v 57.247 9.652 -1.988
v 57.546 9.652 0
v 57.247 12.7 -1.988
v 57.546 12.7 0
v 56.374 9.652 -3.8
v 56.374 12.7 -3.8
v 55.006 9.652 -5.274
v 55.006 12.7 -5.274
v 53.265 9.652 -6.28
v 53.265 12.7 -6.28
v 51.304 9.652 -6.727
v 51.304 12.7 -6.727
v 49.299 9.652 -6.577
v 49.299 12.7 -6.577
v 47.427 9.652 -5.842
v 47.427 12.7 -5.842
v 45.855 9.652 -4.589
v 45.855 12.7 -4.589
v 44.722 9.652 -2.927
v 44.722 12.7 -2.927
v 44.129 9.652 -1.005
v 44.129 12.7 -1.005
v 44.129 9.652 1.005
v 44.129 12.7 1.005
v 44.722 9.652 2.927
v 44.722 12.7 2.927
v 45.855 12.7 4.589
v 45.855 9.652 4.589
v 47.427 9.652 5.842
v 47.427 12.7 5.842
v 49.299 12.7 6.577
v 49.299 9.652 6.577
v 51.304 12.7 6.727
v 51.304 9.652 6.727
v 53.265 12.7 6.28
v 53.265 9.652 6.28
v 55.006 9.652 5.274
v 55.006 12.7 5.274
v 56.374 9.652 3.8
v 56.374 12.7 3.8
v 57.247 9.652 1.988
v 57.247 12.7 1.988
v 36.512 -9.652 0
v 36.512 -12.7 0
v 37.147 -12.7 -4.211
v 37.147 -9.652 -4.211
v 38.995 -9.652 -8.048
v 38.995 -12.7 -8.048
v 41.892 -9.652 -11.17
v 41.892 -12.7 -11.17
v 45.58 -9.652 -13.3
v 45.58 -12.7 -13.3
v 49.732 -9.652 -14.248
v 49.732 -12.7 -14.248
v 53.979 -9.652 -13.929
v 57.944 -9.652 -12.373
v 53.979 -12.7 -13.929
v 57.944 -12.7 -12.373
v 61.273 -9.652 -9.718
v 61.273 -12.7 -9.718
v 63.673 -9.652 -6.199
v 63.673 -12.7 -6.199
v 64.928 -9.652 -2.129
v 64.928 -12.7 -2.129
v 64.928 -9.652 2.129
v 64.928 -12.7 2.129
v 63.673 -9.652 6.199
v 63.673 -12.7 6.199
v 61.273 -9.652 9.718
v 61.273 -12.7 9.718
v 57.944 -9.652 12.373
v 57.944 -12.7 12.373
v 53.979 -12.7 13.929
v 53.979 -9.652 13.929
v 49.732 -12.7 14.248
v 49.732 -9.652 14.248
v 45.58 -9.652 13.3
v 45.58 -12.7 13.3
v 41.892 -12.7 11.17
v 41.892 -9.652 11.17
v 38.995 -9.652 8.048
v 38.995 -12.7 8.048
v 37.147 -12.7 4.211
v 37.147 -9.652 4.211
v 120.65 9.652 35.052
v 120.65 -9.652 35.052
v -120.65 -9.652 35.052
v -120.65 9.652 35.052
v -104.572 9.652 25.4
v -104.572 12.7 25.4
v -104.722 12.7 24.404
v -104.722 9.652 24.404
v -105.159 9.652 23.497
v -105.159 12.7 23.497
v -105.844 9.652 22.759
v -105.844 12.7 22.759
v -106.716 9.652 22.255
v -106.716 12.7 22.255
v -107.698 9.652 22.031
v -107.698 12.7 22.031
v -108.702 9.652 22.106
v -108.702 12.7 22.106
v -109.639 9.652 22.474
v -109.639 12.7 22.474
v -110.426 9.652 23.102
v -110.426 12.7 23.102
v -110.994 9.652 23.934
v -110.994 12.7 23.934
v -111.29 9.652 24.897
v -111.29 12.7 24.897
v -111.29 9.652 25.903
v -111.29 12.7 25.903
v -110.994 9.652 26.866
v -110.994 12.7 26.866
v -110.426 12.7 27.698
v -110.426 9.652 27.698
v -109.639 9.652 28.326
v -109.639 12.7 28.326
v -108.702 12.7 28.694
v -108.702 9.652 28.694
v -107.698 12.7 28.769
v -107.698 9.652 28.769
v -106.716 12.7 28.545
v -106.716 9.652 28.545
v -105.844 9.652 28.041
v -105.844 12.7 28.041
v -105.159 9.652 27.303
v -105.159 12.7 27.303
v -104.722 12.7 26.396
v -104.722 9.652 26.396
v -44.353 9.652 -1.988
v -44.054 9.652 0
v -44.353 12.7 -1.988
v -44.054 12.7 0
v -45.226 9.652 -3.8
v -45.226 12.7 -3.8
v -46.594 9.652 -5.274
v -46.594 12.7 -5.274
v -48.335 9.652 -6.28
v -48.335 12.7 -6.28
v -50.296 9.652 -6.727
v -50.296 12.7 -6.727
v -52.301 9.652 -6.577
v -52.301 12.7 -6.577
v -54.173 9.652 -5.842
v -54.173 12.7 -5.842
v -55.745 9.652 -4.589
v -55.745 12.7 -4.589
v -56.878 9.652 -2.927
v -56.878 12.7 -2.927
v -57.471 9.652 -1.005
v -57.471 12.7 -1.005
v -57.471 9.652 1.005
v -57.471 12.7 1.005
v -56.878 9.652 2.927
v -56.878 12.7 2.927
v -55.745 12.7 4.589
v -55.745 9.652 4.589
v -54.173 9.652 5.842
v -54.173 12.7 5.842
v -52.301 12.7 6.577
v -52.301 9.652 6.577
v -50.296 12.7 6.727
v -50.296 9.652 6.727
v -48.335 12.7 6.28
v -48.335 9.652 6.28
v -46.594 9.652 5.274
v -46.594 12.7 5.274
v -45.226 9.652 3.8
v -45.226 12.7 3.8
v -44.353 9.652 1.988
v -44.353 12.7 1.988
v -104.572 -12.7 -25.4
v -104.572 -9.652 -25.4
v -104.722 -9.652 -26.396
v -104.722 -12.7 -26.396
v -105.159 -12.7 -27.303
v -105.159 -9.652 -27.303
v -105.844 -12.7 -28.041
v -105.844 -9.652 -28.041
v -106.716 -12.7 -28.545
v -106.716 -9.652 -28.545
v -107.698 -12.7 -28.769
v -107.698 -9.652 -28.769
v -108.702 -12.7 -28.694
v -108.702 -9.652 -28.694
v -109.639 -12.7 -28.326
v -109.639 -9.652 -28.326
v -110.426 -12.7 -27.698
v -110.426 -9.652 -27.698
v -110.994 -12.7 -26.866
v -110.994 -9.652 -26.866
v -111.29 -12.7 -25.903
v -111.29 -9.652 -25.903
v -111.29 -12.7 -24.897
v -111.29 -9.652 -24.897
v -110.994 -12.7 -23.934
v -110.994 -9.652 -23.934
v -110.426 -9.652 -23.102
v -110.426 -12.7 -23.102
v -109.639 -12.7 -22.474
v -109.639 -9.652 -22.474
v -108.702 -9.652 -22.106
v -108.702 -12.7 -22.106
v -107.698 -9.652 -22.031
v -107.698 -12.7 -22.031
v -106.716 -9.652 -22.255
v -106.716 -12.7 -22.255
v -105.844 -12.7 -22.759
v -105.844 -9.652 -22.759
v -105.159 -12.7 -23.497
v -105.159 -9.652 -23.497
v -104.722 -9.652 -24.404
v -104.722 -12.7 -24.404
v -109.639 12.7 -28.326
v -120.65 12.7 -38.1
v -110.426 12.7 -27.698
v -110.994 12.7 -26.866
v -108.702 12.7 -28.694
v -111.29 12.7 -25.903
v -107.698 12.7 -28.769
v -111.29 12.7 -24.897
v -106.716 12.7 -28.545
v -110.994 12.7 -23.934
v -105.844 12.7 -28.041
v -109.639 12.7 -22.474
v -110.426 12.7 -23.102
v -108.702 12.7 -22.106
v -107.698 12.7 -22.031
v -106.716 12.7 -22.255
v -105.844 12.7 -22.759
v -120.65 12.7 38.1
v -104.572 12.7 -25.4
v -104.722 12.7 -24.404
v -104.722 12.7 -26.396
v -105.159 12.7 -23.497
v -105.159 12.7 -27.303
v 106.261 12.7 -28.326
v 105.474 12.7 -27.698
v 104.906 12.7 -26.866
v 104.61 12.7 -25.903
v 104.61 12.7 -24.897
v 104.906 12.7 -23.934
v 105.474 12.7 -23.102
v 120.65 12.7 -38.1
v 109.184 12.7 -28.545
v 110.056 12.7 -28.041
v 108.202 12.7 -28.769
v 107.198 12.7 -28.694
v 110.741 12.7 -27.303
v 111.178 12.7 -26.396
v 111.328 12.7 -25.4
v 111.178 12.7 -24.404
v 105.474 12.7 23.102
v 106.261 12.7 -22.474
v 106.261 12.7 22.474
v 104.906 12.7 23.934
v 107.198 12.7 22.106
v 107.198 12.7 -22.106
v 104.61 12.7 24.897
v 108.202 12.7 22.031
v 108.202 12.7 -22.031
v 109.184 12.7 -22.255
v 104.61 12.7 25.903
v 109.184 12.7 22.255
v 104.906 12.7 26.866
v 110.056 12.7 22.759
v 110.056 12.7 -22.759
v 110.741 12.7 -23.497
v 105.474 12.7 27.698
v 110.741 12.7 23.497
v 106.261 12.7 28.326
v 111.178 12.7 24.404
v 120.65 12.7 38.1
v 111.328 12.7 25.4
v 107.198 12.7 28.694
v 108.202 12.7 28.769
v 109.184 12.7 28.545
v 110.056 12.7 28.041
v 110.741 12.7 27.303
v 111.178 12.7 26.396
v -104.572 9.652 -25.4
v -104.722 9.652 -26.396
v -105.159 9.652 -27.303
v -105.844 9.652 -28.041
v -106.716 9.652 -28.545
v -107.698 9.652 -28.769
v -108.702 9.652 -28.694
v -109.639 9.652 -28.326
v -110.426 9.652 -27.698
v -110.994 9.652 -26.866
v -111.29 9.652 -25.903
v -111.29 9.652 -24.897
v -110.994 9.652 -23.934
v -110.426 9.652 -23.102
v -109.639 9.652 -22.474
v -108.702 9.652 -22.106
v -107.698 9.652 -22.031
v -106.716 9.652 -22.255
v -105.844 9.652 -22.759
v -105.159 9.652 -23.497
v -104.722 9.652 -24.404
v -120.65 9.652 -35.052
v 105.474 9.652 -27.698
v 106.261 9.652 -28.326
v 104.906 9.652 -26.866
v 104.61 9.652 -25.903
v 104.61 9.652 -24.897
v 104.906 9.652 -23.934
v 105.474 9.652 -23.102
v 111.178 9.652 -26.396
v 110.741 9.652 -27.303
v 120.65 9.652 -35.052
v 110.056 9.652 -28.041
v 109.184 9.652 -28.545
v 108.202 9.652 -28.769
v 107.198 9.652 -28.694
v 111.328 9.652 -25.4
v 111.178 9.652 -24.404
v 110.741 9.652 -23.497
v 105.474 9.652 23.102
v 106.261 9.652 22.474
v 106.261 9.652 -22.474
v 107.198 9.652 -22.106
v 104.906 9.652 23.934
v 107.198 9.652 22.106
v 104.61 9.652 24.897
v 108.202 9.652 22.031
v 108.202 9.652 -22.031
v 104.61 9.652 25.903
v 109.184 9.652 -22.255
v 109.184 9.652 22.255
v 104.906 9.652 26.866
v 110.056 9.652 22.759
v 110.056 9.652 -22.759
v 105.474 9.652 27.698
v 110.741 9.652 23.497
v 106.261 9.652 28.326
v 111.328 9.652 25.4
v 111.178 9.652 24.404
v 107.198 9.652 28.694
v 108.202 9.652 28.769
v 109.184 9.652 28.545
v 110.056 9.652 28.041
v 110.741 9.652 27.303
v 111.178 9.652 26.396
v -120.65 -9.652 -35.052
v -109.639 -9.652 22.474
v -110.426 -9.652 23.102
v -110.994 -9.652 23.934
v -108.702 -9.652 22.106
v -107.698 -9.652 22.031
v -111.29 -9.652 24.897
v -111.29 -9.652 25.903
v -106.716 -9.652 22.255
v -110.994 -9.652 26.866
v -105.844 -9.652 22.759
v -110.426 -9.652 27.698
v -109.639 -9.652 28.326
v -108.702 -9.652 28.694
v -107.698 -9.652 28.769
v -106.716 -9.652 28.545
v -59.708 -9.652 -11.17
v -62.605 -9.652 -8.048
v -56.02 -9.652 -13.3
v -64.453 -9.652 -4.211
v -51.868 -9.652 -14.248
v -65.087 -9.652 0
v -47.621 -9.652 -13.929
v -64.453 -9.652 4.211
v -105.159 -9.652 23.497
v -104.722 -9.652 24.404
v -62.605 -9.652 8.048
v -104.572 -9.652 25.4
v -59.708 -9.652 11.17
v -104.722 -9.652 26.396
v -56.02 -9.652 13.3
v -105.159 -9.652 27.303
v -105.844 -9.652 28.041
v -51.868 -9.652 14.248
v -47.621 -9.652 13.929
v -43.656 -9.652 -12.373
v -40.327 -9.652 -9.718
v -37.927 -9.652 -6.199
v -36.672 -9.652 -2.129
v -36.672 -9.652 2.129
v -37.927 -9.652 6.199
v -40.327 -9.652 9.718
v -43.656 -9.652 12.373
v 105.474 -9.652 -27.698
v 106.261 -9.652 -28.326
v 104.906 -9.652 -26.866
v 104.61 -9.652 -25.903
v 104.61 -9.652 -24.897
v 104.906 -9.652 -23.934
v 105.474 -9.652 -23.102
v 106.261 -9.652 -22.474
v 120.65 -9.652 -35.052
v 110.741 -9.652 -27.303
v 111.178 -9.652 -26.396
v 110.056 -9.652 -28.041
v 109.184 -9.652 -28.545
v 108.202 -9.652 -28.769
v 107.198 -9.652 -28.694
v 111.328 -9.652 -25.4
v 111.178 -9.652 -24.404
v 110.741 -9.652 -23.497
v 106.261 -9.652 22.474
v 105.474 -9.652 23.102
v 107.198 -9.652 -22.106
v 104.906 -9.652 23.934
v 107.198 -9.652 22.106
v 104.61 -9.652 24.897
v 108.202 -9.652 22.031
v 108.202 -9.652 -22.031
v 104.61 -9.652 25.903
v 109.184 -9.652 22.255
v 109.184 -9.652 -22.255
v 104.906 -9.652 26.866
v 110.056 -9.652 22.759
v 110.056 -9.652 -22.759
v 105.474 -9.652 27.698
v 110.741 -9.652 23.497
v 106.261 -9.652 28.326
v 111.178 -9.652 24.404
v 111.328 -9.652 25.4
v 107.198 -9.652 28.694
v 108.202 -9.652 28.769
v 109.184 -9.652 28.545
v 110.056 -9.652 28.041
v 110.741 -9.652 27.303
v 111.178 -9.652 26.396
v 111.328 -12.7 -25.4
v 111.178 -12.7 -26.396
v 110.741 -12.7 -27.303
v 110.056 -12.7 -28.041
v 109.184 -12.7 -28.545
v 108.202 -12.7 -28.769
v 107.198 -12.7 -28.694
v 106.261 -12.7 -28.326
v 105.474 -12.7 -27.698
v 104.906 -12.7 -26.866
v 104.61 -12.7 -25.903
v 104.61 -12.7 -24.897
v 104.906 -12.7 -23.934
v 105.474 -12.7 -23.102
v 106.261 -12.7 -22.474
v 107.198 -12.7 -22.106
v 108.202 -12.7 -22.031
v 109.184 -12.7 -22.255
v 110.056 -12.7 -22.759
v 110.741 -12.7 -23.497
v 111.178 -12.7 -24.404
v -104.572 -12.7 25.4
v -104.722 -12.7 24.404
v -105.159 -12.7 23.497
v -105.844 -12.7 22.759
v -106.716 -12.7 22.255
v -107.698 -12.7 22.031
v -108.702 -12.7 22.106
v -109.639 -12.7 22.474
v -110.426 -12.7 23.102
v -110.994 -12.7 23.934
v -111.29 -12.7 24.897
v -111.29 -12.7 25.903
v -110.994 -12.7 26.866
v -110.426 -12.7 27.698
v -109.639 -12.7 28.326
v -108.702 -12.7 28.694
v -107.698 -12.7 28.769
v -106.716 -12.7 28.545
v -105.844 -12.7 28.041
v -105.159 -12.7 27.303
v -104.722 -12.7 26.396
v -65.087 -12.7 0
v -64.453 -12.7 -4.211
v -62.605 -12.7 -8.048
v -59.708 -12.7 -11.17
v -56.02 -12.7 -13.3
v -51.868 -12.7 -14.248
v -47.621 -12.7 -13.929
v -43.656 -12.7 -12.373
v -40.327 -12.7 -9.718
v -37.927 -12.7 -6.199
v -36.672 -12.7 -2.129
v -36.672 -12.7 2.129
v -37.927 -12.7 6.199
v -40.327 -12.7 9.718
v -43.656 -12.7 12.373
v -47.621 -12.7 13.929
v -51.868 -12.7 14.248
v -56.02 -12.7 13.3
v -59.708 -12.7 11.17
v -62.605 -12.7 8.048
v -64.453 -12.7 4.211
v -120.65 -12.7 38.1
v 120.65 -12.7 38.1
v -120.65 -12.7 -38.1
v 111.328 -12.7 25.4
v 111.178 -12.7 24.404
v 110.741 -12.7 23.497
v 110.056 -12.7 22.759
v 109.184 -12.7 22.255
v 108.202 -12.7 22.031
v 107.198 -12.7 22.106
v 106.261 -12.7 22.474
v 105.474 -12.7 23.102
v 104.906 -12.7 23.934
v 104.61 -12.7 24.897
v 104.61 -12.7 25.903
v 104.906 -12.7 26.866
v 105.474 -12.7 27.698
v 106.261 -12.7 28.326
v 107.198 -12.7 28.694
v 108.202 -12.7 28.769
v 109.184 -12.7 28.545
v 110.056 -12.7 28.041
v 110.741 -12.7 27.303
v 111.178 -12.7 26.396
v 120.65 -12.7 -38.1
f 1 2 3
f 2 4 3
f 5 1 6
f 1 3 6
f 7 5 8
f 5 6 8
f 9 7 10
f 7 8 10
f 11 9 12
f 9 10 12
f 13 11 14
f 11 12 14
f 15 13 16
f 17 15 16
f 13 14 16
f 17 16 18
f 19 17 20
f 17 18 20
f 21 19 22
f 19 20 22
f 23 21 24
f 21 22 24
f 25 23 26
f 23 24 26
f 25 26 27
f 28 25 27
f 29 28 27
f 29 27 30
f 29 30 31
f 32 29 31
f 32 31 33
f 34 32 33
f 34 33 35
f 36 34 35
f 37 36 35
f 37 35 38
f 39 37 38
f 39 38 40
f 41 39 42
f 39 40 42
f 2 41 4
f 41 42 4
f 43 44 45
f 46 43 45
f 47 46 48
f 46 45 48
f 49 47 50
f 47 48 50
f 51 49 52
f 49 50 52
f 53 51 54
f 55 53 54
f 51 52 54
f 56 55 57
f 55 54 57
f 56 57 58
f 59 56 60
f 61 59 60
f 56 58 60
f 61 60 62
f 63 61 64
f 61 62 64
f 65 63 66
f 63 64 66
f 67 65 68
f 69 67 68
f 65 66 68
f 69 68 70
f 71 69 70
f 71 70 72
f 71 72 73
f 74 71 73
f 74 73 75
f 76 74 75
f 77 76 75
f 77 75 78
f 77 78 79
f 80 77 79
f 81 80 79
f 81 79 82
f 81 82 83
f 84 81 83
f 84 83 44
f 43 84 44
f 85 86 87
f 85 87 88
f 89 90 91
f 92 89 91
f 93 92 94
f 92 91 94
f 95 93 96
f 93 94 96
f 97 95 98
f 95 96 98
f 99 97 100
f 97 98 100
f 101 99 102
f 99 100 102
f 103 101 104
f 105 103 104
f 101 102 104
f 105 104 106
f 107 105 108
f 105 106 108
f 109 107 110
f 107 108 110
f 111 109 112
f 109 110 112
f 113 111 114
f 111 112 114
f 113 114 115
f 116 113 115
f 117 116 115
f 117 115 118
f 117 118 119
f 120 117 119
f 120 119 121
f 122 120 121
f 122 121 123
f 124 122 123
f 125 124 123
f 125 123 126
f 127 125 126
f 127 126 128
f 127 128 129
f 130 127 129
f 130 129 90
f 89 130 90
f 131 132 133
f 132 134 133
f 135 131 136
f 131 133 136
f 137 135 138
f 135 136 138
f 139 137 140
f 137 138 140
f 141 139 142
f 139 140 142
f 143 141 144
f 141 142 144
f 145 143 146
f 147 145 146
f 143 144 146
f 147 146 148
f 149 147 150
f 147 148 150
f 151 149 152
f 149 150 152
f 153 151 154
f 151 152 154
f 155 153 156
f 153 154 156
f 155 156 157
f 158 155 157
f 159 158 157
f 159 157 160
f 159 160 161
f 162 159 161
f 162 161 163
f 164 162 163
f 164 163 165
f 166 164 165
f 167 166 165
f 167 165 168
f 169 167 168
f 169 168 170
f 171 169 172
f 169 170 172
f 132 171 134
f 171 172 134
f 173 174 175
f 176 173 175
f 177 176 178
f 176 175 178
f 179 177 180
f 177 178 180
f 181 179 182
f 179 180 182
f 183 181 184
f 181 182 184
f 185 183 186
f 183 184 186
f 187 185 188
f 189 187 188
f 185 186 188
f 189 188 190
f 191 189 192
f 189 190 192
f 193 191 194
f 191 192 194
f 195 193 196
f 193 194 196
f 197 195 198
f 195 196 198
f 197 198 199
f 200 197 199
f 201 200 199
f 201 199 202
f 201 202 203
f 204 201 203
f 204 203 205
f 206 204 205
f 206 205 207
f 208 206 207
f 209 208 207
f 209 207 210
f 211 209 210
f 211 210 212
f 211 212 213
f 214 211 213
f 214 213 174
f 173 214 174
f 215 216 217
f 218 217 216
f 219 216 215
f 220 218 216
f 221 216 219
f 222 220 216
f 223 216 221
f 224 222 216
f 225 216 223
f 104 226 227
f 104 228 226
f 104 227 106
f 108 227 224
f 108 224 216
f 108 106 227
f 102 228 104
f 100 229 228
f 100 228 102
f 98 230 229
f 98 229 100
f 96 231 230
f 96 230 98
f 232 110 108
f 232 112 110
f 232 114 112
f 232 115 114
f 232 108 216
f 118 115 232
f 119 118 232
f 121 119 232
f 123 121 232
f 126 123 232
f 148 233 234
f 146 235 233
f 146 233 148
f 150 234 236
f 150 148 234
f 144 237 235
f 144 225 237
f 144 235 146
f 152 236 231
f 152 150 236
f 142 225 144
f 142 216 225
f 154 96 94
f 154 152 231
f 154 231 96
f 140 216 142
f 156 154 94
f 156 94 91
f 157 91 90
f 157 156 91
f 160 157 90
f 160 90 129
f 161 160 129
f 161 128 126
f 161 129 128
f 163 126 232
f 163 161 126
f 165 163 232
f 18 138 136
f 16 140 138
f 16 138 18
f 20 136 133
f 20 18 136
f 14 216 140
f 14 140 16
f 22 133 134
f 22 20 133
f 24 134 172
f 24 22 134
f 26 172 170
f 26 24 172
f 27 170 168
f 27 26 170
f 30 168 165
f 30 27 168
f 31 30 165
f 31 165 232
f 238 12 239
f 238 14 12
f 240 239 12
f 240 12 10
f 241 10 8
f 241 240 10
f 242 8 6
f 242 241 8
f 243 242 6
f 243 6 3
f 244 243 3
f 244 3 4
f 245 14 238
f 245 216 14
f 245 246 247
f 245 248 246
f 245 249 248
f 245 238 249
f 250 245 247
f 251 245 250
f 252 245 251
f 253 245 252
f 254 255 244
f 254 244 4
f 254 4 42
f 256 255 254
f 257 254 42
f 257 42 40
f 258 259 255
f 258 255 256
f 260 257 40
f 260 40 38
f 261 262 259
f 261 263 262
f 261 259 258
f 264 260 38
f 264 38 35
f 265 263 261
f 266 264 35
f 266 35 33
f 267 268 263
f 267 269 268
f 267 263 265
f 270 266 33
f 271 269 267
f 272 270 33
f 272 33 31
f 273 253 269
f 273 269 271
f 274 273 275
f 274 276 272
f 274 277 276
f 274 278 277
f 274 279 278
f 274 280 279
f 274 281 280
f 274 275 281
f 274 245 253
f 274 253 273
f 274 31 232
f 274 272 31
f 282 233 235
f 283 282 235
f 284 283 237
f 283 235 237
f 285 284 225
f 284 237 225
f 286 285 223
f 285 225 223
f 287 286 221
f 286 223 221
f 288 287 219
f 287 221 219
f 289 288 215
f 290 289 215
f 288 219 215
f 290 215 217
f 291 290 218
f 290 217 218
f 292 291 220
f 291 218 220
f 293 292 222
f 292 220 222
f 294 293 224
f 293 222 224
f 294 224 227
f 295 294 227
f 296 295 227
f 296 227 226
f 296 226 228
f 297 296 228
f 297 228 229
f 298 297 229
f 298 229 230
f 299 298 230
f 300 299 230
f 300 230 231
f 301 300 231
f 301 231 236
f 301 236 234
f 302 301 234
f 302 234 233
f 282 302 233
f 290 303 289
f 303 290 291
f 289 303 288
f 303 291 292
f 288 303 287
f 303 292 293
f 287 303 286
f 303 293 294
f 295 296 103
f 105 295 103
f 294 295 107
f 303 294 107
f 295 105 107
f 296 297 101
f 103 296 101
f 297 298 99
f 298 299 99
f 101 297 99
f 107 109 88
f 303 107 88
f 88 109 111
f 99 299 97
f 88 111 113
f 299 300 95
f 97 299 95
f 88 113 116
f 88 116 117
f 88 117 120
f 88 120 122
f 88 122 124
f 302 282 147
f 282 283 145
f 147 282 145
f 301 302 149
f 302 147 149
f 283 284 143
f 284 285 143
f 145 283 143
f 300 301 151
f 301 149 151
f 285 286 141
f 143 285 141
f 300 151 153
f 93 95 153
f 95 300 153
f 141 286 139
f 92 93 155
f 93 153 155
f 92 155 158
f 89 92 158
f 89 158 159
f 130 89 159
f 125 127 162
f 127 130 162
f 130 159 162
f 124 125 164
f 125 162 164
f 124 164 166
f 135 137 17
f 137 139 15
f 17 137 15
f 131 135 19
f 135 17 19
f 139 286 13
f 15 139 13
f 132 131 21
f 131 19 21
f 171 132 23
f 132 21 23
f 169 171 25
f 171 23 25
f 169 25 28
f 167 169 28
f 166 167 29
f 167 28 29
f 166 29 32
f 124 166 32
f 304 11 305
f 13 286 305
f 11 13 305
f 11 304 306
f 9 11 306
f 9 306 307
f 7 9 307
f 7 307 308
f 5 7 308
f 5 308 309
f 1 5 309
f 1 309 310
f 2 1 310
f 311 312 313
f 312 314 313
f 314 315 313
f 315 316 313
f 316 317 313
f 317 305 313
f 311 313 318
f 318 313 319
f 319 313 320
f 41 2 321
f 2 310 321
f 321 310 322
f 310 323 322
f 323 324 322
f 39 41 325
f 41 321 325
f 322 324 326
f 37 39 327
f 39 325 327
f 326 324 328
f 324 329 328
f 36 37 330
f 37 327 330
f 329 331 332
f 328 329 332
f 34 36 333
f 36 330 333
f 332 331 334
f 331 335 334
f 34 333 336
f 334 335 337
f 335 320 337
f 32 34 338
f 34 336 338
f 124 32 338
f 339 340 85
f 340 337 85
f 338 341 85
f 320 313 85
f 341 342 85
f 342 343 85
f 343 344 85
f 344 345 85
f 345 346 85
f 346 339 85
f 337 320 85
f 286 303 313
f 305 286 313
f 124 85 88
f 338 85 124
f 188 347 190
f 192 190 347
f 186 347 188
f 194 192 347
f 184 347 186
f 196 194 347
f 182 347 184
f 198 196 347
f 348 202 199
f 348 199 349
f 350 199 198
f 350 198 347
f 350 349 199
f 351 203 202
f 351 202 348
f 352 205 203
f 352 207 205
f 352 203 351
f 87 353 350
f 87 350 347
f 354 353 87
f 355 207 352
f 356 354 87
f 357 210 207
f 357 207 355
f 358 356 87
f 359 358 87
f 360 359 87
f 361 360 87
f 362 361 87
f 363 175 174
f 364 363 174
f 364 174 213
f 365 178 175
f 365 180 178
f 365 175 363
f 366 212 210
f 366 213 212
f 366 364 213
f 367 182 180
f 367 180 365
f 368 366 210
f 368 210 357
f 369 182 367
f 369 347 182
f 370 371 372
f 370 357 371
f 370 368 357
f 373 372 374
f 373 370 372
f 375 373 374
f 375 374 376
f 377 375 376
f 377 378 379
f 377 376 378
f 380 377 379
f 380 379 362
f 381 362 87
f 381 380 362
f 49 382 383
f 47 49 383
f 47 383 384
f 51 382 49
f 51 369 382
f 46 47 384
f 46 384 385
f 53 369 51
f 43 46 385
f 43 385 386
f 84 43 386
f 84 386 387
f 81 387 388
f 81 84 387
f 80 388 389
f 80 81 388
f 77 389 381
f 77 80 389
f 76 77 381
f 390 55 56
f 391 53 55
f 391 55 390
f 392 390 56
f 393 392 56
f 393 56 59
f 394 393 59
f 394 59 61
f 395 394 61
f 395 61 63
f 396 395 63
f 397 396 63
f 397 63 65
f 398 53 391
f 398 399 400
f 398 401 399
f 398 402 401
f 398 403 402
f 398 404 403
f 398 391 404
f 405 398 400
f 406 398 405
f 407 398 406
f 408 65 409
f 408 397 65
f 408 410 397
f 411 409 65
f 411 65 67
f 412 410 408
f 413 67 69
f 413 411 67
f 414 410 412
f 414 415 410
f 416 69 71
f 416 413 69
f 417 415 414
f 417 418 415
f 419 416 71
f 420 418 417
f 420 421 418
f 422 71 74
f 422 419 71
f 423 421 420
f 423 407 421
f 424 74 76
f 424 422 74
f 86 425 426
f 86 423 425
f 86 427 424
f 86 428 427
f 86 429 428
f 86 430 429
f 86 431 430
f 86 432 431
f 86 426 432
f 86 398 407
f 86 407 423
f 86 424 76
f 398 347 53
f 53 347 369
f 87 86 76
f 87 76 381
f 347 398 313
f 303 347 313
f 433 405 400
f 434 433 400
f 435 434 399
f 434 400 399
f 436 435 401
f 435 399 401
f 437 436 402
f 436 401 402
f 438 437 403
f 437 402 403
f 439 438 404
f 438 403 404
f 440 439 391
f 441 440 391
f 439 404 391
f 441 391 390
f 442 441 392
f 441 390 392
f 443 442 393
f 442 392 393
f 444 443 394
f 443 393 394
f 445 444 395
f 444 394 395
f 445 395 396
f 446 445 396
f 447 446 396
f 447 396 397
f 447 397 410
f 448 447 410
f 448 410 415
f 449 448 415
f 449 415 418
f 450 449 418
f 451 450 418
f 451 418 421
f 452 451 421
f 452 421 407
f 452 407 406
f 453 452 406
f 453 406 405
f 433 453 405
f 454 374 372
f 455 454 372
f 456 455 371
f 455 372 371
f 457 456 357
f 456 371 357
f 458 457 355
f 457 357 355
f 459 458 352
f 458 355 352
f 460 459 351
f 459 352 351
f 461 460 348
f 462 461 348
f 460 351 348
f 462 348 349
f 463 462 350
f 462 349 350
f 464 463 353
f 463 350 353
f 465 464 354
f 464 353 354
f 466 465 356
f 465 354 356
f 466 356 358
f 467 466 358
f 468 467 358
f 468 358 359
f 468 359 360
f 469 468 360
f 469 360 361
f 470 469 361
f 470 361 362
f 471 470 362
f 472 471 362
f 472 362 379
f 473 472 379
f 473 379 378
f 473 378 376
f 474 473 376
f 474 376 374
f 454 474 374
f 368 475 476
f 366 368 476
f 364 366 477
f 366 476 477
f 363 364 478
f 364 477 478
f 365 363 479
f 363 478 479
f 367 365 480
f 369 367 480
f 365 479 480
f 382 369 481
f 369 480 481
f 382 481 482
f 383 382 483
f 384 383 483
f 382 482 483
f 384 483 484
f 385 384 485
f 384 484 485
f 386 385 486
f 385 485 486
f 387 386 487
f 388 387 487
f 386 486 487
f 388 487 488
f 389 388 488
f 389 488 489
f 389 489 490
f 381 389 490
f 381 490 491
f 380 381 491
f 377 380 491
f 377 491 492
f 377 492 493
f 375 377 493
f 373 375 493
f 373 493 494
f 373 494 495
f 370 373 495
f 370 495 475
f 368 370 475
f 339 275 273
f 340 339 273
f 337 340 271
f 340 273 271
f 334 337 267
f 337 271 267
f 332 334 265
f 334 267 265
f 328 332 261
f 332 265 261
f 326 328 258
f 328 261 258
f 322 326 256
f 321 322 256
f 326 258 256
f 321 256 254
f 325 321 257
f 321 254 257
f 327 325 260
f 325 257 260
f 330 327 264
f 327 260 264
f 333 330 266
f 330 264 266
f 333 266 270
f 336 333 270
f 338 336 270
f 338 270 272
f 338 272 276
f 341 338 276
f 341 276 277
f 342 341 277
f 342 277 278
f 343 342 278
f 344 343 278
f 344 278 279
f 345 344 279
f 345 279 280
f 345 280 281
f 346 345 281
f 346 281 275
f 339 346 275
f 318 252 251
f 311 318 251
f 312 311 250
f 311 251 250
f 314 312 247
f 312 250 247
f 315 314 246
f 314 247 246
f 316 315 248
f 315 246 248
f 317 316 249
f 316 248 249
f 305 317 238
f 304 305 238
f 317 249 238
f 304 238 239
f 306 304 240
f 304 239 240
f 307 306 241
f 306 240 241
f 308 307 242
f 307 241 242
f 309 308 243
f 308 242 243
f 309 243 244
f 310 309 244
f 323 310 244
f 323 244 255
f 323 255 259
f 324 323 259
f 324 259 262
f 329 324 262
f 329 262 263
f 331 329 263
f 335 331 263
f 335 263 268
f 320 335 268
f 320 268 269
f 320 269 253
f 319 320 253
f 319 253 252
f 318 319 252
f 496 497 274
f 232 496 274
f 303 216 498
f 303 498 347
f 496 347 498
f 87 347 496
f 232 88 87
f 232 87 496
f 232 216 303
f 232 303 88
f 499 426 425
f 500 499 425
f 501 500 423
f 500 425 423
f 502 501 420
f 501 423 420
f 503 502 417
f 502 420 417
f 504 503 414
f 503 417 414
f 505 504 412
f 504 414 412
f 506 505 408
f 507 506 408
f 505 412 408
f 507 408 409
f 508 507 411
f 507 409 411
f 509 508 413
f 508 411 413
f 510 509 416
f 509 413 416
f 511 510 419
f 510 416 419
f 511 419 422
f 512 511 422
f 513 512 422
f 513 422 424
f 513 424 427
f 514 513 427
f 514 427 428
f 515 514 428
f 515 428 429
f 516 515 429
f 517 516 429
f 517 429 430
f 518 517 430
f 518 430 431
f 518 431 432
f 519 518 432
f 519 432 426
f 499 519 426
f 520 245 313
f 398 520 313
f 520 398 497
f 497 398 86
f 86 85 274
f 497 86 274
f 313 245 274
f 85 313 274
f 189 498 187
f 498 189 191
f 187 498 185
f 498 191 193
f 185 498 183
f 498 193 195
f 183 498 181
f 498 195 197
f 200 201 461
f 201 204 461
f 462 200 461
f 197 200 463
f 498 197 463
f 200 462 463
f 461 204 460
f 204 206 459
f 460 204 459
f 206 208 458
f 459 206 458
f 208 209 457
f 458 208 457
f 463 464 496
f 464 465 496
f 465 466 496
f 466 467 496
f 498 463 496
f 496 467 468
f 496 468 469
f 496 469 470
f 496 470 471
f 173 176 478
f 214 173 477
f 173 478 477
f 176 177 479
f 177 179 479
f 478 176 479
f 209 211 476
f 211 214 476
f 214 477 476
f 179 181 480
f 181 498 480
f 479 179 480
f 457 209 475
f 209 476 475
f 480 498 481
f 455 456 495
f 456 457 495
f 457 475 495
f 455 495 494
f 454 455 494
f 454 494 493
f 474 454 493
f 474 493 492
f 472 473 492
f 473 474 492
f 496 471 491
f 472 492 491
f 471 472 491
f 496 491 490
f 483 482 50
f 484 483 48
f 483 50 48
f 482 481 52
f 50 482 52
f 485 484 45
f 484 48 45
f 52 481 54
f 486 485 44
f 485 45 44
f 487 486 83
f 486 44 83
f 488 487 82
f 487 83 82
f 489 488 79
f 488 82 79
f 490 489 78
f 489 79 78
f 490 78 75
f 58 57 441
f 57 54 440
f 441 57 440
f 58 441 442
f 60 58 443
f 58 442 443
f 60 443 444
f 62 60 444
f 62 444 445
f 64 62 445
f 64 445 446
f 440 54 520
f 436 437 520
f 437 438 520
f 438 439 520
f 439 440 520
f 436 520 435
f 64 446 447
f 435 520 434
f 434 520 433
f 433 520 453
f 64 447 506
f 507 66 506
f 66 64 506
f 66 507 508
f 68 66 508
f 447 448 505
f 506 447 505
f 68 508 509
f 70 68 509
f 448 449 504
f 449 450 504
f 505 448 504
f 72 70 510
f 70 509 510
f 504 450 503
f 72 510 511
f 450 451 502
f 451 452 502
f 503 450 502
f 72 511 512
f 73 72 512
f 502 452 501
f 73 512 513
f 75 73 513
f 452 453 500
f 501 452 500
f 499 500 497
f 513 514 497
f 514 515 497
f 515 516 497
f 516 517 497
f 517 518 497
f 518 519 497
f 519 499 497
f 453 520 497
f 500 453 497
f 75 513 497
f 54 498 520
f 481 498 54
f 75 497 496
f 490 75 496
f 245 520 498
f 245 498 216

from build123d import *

# Parameters (mm, degrees)
SKETCH11_W                               = 76.2
SKETCH11_H                               = 25.4
SKETCH11_W_2                             = 70.104
SKETCH11_H_2                             = 19.304
RECTANGULAR_TUBE_1_5_X_3_X_125_1_DEPTH   = 241.3
CBORE_FOR_1_2_HEX_HEAD_BOLT1_D           = 13.49248
CBORE_FOR_1_2_HEX_HEAD_BOLT1_CBORE_D     = 28.575
CBORE_FOR_1_2_HEX_HEAD_BOLT1_CBORE_DEPTH = 3.175
F_1_4_CLEARANCE_HOLE1_D                  = 6.7564


with BuildPart() as part:
    # Sketch11 → Rectangular tube 1.5 X 3 X .125(1) (new body)
    with BuildSketch(Plane.ZY.offset(-120.65)):
        Rectangle(SKETCH11_W, SKETCH11_H)
        Rectangle(SKETCH11_W_2, SKETCH11_H_2, mode=Mode.SUBTRACT)
    extrude(amount=RECTANGULAR_TUBE_1_5_X_3_X_125_1_DEPTH)

    # CBORE for 1/2 Hex Head Bolt1 (through all)
    with Locations(Plane(origin=(0, -12.7, 0), x_dir=(-1, 0, 0), z_dir=(0, -1, 0))):
        with Locations((50.8, 0), (-50.8, 0)):
            CounterBoreHole(CBORE_FOR_1_2_HEX_HEAD_BOLT1_D / 2, CBORE_FOR_1_2_HEX_HEAD_BOLT1_CBORE_D / 2, CBORE_FOR_1_2_HEX_HEAD_BOLT1_CBORE_DEPTH)

    # 1/4 Clearance Hole1 (through all)
    with Locations(Plane(origin=(0, -12.7, 0), x_dir=(-1, 0, 0), z_dir=(0, -1, 0))):
        with Locations((107.95, -25.4), (107.95, 25.4), (-107.95, 25.4), (-107.95, -25.4)):
            Hole(F_1_4_CLEARANCE_HOLE1_D / 2)


solid = part.part
